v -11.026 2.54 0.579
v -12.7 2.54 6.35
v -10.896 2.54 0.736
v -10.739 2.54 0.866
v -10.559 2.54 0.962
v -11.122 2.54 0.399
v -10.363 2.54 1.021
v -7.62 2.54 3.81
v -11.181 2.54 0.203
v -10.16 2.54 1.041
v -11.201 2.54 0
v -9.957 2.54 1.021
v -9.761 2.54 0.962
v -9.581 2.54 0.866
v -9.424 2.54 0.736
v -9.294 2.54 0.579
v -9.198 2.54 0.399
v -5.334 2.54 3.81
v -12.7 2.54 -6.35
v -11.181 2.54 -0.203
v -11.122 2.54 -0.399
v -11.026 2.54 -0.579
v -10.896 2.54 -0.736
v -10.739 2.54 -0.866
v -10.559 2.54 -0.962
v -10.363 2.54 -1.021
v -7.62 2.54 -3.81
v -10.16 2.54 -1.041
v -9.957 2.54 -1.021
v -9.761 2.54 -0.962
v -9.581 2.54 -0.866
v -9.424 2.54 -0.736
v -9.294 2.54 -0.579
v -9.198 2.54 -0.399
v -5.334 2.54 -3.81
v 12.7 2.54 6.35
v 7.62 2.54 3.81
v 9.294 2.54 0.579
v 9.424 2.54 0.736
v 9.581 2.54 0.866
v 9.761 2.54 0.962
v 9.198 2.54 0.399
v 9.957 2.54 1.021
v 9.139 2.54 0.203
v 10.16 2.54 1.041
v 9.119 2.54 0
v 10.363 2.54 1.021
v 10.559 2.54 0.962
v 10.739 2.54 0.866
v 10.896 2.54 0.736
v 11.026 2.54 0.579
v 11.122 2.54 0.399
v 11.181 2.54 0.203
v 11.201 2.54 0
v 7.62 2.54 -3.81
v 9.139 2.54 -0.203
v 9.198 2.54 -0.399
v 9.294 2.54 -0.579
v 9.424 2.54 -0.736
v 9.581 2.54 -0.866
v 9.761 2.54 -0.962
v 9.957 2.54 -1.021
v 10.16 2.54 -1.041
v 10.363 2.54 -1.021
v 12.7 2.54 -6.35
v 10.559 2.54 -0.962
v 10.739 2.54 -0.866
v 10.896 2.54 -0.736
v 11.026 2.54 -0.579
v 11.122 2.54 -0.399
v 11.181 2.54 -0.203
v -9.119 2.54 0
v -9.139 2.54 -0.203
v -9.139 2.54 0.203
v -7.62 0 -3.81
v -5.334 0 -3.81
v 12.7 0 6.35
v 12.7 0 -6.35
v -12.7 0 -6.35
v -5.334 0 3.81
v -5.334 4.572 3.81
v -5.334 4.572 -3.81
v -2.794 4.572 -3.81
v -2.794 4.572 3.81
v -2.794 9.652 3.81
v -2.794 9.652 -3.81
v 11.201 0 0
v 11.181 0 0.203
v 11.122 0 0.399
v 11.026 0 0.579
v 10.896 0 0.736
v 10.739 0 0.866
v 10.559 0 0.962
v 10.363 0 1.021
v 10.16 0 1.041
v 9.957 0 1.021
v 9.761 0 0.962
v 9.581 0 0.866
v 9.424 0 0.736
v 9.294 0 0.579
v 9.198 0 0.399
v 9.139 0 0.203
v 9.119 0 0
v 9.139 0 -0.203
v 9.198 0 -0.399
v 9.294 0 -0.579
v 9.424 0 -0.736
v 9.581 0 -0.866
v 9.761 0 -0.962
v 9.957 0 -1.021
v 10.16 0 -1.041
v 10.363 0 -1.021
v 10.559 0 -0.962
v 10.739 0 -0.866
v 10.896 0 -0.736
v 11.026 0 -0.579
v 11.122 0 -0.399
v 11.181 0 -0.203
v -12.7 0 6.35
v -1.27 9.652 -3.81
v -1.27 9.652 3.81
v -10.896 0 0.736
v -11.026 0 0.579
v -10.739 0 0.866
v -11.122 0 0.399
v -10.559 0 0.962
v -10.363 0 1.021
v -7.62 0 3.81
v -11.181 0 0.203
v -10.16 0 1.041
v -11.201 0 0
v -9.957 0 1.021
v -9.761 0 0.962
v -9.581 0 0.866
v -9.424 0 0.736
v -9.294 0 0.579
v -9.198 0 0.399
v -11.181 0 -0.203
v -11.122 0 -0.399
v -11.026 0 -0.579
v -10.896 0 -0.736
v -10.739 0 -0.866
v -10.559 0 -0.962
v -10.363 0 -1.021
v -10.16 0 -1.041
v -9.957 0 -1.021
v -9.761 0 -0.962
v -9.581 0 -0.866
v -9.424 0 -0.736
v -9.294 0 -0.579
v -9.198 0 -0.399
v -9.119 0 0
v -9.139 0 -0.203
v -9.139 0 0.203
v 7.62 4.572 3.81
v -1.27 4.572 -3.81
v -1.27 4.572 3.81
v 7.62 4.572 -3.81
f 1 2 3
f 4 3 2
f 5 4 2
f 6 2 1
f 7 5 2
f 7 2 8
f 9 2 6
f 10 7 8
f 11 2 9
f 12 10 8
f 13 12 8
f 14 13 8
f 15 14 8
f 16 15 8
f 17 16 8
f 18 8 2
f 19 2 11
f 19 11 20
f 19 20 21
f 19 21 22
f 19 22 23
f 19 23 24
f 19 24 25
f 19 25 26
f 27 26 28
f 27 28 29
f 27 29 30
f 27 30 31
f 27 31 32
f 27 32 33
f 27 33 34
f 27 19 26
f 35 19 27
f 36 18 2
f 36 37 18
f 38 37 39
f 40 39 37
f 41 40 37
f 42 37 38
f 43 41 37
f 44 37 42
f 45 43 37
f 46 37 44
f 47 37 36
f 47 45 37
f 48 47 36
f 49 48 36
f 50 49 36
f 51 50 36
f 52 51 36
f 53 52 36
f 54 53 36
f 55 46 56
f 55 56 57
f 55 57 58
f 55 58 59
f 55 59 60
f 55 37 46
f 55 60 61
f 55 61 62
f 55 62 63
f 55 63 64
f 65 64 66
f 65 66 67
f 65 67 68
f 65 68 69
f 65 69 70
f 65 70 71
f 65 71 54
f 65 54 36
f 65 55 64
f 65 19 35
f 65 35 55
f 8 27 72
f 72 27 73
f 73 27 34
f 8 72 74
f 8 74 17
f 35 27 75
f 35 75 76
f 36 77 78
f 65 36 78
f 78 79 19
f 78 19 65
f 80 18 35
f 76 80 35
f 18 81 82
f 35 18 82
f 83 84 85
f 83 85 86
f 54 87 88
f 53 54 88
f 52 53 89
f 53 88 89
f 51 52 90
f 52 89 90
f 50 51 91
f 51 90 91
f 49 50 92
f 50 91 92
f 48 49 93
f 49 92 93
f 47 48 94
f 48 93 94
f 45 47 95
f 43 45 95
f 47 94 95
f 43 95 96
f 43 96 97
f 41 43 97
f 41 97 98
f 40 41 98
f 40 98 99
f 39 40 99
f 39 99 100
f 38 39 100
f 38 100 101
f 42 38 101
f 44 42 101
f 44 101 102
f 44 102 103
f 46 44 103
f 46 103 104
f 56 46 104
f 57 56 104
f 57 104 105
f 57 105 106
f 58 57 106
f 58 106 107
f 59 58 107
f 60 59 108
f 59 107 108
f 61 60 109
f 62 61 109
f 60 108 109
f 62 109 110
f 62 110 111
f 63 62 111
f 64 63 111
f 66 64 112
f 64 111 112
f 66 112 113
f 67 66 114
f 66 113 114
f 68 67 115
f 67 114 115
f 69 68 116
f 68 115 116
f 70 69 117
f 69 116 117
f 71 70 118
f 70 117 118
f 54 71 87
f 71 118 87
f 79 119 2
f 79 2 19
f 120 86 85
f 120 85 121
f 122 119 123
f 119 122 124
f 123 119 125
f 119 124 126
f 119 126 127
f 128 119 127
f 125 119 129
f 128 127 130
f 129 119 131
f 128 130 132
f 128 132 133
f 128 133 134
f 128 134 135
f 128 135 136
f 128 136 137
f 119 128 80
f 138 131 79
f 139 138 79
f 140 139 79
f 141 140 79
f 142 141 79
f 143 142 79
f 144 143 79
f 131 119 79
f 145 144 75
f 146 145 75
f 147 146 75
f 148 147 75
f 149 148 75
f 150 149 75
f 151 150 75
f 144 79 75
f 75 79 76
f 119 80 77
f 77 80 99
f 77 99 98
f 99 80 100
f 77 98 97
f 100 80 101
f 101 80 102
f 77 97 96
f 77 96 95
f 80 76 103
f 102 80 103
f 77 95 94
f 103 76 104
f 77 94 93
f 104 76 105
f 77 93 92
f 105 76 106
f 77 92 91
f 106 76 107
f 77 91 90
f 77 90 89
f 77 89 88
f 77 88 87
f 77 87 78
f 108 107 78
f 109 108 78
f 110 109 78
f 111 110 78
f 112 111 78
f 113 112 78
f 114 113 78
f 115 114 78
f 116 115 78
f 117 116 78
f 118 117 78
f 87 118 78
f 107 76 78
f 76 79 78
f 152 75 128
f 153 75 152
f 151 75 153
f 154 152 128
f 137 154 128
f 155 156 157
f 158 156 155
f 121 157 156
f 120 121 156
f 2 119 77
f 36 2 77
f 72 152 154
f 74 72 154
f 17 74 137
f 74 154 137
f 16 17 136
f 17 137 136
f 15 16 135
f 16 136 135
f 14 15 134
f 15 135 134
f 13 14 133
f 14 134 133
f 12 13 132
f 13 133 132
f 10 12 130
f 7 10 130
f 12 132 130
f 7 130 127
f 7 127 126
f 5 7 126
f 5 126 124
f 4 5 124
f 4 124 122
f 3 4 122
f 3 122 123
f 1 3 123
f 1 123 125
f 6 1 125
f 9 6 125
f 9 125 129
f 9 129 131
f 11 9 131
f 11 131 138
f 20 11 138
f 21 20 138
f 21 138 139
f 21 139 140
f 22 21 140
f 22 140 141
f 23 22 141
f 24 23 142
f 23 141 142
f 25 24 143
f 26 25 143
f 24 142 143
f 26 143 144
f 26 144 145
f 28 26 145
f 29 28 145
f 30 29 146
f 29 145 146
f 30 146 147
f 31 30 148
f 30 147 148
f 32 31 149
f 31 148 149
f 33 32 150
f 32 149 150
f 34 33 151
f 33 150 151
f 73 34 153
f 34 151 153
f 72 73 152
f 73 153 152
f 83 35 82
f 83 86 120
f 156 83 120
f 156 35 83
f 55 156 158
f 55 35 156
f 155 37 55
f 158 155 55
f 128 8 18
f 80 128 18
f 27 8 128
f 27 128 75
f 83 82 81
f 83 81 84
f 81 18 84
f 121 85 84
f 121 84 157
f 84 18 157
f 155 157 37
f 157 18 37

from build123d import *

# Parameters (mm, degrees)
SKETCH1_W           = 25.4
SKETCH1_H           = 12.7
BOSS_EXTRUDE1_DEPTH = 2.54
SKETCH2_W           = 15.24
SKETCH2_H           = 7.62
BOSS_EXTRUDE2_DEPTH = 2.032
SKETCH3_R           = 1.0414
CUT_EXTRUDE1_DEPTH  = 5.572
SKETCH4_W           = 2.286
SKETCH4_H           = 7.62
CUT_EXTRUDE2_DEPTH  = 4.572
SKETCH5_W           = 1.524
SKETCH5_H           = 7.62
BOSS_EXTRUDE3_DEPTH = 5.08


with BuildPart() as part:
    # Sketch1 → Boss-Extrude1 (new body)
    with BuildSketch(Plane(origin=(0, 0, 0), x_dir=(1, 0, 0), z_dir=(0, 1, 0))):
        Rectangle(SKETCH1_W, SKETCH1_H)
    extrude(amount=BOSS_EXTRUDE1_DEPTH)

    # Sketch2 → Boss-Extrude2 (add)
    with BuildSketch(Plane(origin=(0, 2.54, 0), x_dir=(1, 0, 0), z_dir=(0, 1, 0))):
        Rectangle(SKETCH2_W, SKETCH2_H)
    extrude(amount=BOSS_EXTRUDE2_DEPTH)

    # Sketch3 → Cut-Extrude1 (cut, through all)
    with BuildSketch(Plane.XZ):
        with Locations((-10.16, 0)):
            Circle(SKETCH3_R)
        with Locations((10.16, 0)):
            Circle(SKETCH3_R)
    extrude(amount=-CUT_EXTRUDE1_DEPTH, mode=Mode.SUBTRACT)

    # Sketch4 → Cut-Extrude2 (cut)
    with BuildSketch(Plane(origin=(0, 4.572, 0), x_dir=(1, 0, 0), z_dir=(0, 1, 0))):
        with Locations((-6.477, 0)):
            Rectangle(SKETCH4_W, SKETCH4_H)
    extrude(amount=-CUT_EXTRUDE2_DEPTH, mode=Mode.SUBTRACT)

    # Sketch5 → Boss-Extrude3 (add)
    with BuildSketch(Plane(origin=(0, 4.572, 0), x_dir=(1, 0, 0), z_dir=(0, 1, 0))):
        with Locations((-2.032, 0)):
            Rectangle(SKETCH5_W, SKETCH5_H)
    extrude(amount=BOSS_EXTRUDE3_DEPTH)


solid = part.part
